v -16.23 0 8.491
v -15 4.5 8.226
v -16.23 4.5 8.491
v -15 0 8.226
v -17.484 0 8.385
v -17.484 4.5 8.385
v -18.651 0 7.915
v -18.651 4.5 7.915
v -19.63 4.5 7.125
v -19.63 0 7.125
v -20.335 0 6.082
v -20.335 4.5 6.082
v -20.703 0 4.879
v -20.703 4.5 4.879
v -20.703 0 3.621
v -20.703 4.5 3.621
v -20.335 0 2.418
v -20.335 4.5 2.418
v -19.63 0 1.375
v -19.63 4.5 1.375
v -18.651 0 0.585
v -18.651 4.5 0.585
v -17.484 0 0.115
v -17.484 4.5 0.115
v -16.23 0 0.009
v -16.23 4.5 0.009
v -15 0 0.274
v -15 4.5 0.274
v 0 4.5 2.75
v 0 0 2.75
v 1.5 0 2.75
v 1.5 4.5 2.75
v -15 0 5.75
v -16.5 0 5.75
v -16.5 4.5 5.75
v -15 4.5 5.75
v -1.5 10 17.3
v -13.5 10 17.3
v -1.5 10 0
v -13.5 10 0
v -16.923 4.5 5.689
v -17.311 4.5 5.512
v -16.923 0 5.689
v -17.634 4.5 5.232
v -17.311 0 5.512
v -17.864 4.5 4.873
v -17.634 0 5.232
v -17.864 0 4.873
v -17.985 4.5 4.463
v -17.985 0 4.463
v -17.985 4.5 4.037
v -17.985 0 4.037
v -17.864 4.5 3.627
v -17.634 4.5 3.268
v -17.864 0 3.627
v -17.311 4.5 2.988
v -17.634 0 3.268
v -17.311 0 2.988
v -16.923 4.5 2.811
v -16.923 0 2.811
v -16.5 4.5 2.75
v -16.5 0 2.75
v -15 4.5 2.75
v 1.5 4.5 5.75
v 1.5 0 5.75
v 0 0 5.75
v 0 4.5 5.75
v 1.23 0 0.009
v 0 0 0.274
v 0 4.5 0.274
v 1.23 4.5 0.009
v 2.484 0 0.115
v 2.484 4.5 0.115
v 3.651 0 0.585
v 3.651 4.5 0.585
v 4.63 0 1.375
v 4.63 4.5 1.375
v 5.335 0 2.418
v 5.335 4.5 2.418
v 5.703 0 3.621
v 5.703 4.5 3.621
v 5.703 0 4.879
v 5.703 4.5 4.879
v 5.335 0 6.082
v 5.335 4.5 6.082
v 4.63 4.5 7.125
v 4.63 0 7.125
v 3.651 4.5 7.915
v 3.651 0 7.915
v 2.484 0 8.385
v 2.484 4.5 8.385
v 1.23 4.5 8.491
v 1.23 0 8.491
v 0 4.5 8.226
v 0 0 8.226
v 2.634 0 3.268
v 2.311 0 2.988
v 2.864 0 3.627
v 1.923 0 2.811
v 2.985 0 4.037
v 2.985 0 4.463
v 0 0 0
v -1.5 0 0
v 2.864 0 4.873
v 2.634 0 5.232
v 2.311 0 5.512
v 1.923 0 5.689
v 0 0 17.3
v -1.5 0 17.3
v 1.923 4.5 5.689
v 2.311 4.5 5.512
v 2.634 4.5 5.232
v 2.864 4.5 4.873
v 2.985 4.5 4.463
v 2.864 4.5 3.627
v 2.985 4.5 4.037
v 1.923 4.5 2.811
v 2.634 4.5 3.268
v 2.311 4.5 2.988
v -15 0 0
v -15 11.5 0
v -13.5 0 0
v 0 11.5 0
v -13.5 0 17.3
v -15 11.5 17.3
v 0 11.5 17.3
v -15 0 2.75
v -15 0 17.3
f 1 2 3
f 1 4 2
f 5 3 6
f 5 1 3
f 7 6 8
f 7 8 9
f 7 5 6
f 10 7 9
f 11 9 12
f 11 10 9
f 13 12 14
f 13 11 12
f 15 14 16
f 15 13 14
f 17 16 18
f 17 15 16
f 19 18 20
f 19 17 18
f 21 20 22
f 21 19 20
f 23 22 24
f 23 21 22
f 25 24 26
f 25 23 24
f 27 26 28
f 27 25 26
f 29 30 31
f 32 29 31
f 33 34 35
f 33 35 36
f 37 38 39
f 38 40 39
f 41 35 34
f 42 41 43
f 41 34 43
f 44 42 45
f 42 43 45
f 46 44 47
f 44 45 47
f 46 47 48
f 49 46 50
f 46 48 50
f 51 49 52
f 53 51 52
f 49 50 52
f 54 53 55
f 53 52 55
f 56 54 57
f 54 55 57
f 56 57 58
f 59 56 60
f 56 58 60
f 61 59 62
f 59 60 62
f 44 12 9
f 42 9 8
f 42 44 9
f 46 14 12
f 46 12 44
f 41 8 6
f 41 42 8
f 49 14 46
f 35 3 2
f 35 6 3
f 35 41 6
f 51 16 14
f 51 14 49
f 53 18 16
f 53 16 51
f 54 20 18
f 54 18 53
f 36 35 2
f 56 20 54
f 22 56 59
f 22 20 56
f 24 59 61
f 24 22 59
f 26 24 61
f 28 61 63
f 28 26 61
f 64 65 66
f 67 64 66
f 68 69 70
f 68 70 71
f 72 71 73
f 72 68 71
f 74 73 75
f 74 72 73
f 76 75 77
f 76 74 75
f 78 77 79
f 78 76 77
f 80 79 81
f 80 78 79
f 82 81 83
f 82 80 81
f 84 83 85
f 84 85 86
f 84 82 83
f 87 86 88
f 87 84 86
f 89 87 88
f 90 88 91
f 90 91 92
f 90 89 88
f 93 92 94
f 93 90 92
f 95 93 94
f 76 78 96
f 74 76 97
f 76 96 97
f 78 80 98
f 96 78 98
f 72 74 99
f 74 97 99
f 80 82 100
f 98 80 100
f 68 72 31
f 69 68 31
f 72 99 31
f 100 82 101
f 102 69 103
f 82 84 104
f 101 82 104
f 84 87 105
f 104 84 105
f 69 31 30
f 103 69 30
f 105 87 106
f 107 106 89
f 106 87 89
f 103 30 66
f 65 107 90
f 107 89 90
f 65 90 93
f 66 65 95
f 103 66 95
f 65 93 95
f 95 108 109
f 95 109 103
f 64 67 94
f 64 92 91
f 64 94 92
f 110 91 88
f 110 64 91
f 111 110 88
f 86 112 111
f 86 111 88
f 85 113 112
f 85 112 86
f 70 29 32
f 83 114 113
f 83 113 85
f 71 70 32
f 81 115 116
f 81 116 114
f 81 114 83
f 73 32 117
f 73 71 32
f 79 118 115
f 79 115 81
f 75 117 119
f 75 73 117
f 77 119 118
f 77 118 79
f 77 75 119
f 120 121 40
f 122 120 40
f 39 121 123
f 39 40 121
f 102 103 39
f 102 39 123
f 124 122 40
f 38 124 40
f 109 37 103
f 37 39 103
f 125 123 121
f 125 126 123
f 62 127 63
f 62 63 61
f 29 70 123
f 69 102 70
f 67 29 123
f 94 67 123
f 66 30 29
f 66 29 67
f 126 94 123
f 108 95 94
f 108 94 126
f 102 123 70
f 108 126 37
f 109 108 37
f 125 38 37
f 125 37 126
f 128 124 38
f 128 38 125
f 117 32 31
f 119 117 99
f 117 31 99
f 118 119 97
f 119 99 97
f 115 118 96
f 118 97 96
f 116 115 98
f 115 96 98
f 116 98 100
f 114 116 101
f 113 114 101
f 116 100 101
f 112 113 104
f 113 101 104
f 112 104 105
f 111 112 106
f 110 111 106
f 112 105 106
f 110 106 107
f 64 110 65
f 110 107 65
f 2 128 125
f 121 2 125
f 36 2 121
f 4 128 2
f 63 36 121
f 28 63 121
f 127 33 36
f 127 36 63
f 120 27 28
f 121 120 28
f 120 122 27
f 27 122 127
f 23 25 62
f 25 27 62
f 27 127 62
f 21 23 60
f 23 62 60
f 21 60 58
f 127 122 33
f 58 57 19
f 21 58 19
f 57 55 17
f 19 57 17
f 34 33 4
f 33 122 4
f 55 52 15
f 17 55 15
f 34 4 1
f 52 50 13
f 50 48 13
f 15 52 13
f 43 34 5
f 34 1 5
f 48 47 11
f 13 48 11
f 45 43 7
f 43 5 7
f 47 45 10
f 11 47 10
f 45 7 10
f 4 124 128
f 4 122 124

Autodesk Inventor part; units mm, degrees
ref_plane "YZ Plane" through (0, 0, 0) normal (1, 0, 0) x (0, 1, 0)
ref_plane "XZ Plane" through (0, 0, 0) normal (0, 1, 0) x (-1, 0, 0)
ref_plane "XY Plane" through (0, 0, 0) normal (0, 0, 1) x (1, 0, 0)
sketch "Szkic1" plane through (0, 0, 0) normal (0, 1, 0) x (-1, 0, 0)
  line L0 (0, 0) -> (0, 17.3)
  line L1 (0, 17.3) -> (15, 17.3)
  line L2 (15, 17.3) -> (15, 0)
  line L3 (15, 0) -> (0, 0)
  line L4 (0, 0) -> (0, 4.25)
  line L5 (0, 4.25) -> (-1.5, 4.25)
  line L6 (-1.5, 4.25) -> (16.5, 4.25)
  circle A0 centre (-1.5, 4.25) radius 4.25
  circle A1 centre (16.5, 4.25) radius 4.25
  circle A2 centre (-1.5, 4.25) radius 1.5
  circle A3 centre (16.5, 4.25) radius 1.5
  line L7 (15, 2.75) -> (16.5, 2.75)
  line L8 (16.5, 5.75) -> (15, 5.75)
  line L9 (0, 2.75) -> (-1.5, 2.75)
  line L10 (-1.5, 5.75) -> (0, 5.75)
  dimension "d0" = 17.3
  dimension "d1" = 15
  dimension "d2" = 4.25
  dimension "d3" = 1.5
  dimension "d4" = 18
extrude "Wyciągnięcie proste1" add sketch "Szkic1" along normal blind 11.5 contours L0 L6 A0 | L0 A0 L10 A2 L9 | L0 A0 L6 | A0 L6 A1 L2 L3 L0 | A0 L0 L1 L2 A1 L6 | A1 L2 L6 | L6 L2 A1 | A1 L2 L7 A3 L8
sketch "Szkic2" plane through (0, 0, 0) normal (0, 0, -1) x (-1, 0, 0)
  line L0 (15, 0) -> (15, 11.5) projected
  line L1 (15, 0) -> (13.5, 0)
  line L2 (0, 0) -> (15, 0) projected
  line L3 (13.5, 0) -> (13.5, 10)
  line L4 (0, 11.5) -> (15, 11.5) projected
  line L5 (13.5, 10) -> (1.5, 10)
  line L6 (1.5, 10) -> (1.5, 0)
  dimension "d7" = 1.5
  dimension "d8" = 10
  dimension "d9" = 12
extrude "Wyciągnięcie proste2" cut sketch "Szkic2" against normal blind 20
sketch "Szkic3" plane through (0, 11.5, 0) normal (0, 1, 0) x (1, 0, 0)
  line L0 (0, -17.3) -> (0, -8.2265) projected
  line L1 (0, -8.8866) -> (6.1207, -8.8866)
  line L2 (6.1207, -8.8866) -> (6.1207, 0)
  line L3 (6.1207, 0) -> (0, 0)
  line L4 (0, 0) -> (0, -8.8866)
  line L5 (-15, -8.2265) -> (-15, -17.3) projected
  line L6 (-15, -8.8866) -> (-15, 0.446)
  line L7 (-15, 0.446) -> (-21.7347, 0.446)
  line L8 (-21.7347, 0.446) -> (-21.7347, -8.8866)
  line L9 (-21.7347, -8.8866) -> (-15, -8.8866)
extrude "Wyciągnięcie proste3" cut sketch "Szkic3" against normal blind 7
properties part number "przedluzone_mocowanie"
